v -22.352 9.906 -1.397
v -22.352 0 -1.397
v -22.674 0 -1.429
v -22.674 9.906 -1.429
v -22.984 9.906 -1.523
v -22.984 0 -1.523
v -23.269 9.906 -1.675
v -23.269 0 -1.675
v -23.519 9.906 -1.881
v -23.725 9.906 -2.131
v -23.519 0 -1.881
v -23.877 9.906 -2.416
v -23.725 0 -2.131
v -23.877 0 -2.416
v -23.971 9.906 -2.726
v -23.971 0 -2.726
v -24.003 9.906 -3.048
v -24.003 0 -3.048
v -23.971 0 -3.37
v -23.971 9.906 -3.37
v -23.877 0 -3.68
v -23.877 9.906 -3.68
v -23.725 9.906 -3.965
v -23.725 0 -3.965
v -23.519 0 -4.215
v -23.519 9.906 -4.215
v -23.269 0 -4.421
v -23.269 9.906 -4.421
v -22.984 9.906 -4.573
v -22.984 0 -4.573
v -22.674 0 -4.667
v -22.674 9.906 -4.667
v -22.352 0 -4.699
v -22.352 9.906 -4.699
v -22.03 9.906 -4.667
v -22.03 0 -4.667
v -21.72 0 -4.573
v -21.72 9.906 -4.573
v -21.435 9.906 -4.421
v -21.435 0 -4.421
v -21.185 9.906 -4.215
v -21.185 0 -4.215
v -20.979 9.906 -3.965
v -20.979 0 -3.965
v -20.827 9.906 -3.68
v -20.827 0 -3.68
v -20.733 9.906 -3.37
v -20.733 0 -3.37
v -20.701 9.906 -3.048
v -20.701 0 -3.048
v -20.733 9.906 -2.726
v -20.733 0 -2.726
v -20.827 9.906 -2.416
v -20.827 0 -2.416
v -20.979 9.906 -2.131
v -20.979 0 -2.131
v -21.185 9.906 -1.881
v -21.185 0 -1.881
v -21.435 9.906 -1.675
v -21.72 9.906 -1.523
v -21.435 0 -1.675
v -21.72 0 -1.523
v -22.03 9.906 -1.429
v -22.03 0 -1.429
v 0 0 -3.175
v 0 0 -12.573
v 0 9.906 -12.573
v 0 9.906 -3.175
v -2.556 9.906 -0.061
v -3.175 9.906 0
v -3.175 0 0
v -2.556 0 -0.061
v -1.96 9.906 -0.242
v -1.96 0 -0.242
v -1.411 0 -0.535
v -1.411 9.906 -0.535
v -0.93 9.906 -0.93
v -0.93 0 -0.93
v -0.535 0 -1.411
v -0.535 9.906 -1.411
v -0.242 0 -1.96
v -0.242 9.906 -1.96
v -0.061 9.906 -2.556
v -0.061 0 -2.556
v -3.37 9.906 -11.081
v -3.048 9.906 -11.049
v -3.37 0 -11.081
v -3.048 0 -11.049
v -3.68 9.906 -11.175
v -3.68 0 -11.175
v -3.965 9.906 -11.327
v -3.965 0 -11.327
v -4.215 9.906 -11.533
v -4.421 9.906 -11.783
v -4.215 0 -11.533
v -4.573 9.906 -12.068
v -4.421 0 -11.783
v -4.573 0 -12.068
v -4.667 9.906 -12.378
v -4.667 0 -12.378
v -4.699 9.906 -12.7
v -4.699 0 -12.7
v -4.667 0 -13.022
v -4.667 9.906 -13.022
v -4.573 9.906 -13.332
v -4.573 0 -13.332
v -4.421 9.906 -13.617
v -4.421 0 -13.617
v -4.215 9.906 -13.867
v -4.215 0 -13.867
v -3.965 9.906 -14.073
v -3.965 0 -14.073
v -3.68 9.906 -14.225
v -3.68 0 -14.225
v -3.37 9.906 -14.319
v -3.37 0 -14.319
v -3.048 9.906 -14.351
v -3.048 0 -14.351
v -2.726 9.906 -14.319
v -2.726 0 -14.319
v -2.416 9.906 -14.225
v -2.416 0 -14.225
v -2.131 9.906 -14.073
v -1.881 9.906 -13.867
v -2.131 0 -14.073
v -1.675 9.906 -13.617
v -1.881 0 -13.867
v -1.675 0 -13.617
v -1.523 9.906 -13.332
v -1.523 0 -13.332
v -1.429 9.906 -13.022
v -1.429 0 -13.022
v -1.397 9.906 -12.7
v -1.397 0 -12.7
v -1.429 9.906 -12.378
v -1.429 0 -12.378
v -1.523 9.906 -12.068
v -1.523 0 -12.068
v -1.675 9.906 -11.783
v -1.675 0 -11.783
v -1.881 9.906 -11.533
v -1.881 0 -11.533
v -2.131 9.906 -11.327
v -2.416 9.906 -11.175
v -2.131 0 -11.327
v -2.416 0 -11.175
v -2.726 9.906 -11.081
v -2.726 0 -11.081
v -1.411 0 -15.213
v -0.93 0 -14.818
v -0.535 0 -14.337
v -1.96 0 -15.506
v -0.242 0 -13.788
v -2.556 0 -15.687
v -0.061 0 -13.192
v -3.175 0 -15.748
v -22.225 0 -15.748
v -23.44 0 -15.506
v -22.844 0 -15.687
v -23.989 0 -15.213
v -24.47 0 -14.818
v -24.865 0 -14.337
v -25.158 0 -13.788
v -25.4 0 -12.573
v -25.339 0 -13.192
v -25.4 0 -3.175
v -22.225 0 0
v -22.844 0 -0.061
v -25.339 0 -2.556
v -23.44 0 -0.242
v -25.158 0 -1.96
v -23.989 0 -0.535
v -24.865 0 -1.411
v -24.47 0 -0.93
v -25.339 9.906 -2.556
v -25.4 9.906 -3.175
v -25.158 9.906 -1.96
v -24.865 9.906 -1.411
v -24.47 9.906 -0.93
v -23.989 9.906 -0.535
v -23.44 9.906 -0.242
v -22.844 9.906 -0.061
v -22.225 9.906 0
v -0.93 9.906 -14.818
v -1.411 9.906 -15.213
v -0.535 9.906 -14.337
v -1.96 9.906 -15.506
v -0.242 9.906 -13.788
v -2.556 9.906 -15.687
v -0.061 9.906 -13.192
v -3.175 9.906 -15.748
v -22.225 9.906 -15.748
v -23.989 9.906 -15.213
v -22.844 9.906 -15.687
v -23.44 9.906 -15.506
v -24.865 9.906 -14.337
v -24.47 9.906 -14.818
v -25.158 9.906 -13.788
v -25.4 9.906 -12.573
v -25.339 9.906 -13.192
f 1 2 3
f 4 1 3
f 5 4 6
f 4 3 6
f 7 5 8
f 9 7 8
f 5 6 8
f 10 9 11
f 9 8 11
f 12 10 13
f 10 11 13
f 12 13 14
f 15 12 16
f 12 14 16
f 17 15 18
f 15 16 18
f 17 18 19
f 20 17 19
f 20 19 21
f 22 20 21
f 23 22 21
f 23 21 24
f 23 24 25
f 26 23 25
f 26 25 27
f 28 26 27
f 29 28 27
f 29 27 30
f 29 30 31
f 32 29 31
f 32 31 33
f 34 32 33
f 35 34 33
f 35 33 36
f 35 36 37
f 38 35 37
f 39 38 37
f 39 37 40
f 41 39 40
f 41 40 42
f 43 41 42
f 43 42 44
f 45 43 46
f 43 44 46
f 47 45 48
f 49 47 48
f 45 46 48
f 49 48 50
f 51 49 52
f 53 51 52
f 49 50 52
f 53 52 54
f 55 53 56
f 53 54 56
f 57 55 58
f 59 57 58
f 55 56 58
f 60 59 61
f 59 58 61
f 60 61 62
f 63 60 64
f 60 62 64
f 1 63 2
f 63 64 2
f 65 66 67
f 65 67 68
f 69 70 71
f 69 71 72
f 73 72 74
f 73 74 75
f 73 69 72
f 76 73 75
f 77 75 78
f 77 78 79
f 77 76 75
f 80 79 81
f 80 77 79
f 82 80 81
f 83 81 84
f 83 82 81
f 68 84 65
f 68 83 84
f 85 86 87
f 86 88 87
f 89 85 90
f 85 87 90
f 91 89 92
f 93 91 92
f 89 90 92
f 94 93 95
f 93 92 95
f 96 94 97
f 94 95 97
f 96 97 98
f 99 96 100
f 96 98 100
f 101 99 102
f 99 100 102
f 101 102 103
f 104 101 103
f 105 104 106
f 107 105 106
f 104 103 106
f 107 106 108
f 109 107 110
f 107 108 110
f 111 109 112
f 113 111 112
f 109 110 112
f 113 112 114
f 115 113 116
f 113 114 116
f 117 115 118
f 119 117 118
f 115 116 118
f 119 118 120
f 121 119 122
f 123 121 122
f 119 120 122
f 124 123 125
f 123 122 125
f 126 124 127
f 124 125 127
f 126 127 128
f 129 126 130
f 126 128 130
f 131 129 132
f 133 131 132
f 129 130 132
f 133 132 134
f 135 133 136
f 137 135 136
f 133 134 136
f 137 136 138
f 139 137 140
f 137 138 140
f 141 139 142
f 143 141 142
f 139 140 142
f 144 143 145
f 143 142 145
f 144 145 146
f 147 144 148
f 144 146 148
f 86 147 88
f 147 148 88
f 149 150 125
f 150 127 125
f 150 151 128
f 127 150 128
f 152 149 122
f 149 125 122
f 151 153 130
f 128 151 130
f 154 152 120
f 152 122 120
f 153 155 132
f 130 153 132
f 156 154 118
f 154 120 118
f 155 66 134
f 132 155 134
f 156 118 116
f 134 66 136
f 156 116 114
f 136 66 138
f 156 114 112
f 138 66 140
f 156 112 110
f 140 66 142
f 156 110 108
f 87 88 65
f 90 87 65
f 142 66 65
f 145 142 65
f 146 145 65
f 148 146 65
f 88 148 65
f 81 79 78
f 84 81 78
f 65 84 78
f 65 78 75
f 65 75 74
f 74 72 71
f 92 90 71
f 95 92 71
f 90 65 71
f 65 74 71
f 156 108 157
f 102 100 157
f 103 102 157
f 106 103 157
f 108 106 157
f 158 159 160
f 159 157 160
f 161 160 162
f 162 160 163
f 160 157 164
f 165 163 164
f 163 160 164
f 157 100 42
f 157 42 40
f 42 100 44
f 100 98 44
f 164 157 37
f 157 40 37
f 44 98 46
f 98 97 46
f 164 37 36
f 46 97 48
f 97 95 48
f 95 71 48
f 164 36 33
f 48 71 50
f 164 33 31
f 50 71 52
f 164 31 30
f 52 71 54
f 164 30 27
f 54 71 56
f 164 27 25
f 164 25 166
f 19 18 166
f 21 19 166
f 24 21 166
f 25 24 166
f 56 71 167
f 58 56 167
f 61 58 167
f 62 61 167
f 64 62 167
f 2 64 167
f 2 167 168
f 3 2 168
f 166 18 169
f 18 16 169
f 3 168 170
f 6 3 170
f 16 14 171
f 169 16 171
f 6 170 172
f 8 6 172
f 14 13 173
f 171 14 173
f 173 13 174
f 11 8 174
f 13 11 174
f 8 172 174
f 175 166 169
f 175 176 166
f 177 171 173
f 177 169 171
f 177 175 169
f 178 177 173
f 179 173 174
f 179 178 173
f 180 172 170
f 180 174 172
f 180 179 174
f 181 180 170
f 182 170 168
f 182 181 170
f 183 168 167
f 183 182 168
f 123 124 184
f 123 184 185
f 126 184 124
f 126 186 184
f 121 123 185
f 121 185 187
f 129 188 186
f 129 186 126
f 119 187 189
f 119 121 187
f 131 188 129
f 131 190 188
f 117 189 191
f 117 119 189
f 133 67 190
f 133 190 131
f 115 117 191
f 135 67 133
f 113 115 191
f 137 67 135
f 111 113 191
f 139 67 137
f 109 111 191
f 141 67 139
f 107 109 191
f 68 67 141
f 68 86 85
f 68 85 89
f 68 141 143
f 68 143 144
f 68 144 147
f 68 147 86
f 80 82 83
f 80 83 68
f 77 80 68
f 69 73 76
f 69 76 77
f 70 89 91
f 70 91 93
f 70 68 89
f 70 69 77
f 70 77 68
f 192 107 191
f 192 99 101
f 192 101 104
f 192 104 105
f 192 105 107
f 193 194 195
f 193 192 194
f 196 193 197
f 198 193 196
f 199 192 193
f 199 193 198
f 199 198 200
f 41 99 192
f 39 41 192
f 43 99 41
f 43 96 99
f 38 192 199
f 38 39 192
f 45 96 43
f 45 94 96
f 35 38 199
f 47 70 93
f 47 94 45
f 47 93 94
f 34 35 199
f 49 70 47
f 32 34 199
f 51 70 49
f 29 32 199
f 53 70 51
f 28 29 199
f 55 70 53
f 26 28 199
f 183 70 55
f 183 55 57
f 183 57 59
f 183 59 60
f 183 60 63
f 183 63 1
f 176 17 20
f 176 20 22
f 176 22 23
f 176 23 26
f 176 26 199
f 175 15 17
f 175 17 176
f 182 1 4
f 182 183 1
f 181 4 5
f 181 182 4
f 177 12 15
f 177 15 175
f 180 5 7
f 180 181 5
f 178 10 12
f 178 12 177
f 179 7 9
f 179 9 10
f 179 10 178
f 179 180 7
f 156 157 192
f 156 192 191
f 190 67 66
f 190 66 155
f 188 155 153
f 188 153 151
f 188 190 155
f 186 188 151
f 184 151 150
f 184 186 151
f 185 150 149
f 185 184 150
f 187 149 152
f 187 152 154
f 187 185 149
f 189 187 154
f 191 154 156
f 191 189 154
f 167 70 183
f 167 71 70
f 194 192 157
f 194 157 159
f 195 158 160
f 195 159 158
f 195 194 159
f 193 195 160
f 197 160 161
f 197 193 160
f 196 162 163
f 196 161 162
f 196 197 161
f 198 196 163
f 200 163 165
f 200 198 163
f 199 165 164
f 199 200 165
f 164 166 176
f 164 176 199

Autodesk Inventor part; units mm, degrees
ref_plane "YZ Plane" through (0, 0, 0) normal (1, 0, 0) x (0, 1, 0)
ref_plane "XZ Plane" through (0, 0, 0) normal (0, 1, 0) x (-1, 0, 0)
ref_plane "XY Plane" through (0, 0, 0) normal (0, 0, 1) x (1, 0, 0)
sketch "Sketch1" plane through (0, 0, 0) normal (0, 1, 0) x (-1, 0, 0)
  line L0 (0, 0) -> (25.4, 0)
  line L1 (25.4, 0) -> (25.4, -15.748)
  line L2 (25.4, -15.748) -> (0, -15.748)
  line L3 (0, -15.748) -> (0, 0)
  dimension "d0" = 25.4
  dimension "d1" = 15.748
extrude "Extrusion1" add sketch "Sketch1" along normal blind 9.906
sketch "Sketch2" plane through (0, 9.906, 0) normal (0, 1, 0) x (1, 0, 0)
  line L0 (-25.4, 0) -> (0, 0) projected
  line L1 (0, 0) -> (0, 15.748) projected
  line L2 (0, 15.748) -> (-25.4, 15.748) projected
  line L3 (-25.4, 15.748) -> (-25.4, 0) projected
  point P0 (-3.048, 12.7)
  point P1 (-22.352, 3.048)
  dimension "d5" = 3.048
  dimension "d6" = 3.048
  dimension "d7" = 3.048
  dimension "d8" = 3.048
hole "Hole1" at (-3.048, 9.906, -12.7) at (-22.352, 9.906, -3.048) direction (0, -1, 0) diameter 3.302 end through all
fillet "Fillet1" radius 3.175 4 edges at (-25.4, 4.953, 0) (-25.4, 4.953, -15.748) (0, 4.953, -15.748) (0, 4.953, 0)
ref_plane "Work Plane1" through (0, 4.953, 0) normal (0, 1, 0) x (1, 0, 0)
equation "\"d6\" = d5"
equation "\"d7\" = d6"
equation "\"d8\" = d7"
properties part number "LimitSwitch"
